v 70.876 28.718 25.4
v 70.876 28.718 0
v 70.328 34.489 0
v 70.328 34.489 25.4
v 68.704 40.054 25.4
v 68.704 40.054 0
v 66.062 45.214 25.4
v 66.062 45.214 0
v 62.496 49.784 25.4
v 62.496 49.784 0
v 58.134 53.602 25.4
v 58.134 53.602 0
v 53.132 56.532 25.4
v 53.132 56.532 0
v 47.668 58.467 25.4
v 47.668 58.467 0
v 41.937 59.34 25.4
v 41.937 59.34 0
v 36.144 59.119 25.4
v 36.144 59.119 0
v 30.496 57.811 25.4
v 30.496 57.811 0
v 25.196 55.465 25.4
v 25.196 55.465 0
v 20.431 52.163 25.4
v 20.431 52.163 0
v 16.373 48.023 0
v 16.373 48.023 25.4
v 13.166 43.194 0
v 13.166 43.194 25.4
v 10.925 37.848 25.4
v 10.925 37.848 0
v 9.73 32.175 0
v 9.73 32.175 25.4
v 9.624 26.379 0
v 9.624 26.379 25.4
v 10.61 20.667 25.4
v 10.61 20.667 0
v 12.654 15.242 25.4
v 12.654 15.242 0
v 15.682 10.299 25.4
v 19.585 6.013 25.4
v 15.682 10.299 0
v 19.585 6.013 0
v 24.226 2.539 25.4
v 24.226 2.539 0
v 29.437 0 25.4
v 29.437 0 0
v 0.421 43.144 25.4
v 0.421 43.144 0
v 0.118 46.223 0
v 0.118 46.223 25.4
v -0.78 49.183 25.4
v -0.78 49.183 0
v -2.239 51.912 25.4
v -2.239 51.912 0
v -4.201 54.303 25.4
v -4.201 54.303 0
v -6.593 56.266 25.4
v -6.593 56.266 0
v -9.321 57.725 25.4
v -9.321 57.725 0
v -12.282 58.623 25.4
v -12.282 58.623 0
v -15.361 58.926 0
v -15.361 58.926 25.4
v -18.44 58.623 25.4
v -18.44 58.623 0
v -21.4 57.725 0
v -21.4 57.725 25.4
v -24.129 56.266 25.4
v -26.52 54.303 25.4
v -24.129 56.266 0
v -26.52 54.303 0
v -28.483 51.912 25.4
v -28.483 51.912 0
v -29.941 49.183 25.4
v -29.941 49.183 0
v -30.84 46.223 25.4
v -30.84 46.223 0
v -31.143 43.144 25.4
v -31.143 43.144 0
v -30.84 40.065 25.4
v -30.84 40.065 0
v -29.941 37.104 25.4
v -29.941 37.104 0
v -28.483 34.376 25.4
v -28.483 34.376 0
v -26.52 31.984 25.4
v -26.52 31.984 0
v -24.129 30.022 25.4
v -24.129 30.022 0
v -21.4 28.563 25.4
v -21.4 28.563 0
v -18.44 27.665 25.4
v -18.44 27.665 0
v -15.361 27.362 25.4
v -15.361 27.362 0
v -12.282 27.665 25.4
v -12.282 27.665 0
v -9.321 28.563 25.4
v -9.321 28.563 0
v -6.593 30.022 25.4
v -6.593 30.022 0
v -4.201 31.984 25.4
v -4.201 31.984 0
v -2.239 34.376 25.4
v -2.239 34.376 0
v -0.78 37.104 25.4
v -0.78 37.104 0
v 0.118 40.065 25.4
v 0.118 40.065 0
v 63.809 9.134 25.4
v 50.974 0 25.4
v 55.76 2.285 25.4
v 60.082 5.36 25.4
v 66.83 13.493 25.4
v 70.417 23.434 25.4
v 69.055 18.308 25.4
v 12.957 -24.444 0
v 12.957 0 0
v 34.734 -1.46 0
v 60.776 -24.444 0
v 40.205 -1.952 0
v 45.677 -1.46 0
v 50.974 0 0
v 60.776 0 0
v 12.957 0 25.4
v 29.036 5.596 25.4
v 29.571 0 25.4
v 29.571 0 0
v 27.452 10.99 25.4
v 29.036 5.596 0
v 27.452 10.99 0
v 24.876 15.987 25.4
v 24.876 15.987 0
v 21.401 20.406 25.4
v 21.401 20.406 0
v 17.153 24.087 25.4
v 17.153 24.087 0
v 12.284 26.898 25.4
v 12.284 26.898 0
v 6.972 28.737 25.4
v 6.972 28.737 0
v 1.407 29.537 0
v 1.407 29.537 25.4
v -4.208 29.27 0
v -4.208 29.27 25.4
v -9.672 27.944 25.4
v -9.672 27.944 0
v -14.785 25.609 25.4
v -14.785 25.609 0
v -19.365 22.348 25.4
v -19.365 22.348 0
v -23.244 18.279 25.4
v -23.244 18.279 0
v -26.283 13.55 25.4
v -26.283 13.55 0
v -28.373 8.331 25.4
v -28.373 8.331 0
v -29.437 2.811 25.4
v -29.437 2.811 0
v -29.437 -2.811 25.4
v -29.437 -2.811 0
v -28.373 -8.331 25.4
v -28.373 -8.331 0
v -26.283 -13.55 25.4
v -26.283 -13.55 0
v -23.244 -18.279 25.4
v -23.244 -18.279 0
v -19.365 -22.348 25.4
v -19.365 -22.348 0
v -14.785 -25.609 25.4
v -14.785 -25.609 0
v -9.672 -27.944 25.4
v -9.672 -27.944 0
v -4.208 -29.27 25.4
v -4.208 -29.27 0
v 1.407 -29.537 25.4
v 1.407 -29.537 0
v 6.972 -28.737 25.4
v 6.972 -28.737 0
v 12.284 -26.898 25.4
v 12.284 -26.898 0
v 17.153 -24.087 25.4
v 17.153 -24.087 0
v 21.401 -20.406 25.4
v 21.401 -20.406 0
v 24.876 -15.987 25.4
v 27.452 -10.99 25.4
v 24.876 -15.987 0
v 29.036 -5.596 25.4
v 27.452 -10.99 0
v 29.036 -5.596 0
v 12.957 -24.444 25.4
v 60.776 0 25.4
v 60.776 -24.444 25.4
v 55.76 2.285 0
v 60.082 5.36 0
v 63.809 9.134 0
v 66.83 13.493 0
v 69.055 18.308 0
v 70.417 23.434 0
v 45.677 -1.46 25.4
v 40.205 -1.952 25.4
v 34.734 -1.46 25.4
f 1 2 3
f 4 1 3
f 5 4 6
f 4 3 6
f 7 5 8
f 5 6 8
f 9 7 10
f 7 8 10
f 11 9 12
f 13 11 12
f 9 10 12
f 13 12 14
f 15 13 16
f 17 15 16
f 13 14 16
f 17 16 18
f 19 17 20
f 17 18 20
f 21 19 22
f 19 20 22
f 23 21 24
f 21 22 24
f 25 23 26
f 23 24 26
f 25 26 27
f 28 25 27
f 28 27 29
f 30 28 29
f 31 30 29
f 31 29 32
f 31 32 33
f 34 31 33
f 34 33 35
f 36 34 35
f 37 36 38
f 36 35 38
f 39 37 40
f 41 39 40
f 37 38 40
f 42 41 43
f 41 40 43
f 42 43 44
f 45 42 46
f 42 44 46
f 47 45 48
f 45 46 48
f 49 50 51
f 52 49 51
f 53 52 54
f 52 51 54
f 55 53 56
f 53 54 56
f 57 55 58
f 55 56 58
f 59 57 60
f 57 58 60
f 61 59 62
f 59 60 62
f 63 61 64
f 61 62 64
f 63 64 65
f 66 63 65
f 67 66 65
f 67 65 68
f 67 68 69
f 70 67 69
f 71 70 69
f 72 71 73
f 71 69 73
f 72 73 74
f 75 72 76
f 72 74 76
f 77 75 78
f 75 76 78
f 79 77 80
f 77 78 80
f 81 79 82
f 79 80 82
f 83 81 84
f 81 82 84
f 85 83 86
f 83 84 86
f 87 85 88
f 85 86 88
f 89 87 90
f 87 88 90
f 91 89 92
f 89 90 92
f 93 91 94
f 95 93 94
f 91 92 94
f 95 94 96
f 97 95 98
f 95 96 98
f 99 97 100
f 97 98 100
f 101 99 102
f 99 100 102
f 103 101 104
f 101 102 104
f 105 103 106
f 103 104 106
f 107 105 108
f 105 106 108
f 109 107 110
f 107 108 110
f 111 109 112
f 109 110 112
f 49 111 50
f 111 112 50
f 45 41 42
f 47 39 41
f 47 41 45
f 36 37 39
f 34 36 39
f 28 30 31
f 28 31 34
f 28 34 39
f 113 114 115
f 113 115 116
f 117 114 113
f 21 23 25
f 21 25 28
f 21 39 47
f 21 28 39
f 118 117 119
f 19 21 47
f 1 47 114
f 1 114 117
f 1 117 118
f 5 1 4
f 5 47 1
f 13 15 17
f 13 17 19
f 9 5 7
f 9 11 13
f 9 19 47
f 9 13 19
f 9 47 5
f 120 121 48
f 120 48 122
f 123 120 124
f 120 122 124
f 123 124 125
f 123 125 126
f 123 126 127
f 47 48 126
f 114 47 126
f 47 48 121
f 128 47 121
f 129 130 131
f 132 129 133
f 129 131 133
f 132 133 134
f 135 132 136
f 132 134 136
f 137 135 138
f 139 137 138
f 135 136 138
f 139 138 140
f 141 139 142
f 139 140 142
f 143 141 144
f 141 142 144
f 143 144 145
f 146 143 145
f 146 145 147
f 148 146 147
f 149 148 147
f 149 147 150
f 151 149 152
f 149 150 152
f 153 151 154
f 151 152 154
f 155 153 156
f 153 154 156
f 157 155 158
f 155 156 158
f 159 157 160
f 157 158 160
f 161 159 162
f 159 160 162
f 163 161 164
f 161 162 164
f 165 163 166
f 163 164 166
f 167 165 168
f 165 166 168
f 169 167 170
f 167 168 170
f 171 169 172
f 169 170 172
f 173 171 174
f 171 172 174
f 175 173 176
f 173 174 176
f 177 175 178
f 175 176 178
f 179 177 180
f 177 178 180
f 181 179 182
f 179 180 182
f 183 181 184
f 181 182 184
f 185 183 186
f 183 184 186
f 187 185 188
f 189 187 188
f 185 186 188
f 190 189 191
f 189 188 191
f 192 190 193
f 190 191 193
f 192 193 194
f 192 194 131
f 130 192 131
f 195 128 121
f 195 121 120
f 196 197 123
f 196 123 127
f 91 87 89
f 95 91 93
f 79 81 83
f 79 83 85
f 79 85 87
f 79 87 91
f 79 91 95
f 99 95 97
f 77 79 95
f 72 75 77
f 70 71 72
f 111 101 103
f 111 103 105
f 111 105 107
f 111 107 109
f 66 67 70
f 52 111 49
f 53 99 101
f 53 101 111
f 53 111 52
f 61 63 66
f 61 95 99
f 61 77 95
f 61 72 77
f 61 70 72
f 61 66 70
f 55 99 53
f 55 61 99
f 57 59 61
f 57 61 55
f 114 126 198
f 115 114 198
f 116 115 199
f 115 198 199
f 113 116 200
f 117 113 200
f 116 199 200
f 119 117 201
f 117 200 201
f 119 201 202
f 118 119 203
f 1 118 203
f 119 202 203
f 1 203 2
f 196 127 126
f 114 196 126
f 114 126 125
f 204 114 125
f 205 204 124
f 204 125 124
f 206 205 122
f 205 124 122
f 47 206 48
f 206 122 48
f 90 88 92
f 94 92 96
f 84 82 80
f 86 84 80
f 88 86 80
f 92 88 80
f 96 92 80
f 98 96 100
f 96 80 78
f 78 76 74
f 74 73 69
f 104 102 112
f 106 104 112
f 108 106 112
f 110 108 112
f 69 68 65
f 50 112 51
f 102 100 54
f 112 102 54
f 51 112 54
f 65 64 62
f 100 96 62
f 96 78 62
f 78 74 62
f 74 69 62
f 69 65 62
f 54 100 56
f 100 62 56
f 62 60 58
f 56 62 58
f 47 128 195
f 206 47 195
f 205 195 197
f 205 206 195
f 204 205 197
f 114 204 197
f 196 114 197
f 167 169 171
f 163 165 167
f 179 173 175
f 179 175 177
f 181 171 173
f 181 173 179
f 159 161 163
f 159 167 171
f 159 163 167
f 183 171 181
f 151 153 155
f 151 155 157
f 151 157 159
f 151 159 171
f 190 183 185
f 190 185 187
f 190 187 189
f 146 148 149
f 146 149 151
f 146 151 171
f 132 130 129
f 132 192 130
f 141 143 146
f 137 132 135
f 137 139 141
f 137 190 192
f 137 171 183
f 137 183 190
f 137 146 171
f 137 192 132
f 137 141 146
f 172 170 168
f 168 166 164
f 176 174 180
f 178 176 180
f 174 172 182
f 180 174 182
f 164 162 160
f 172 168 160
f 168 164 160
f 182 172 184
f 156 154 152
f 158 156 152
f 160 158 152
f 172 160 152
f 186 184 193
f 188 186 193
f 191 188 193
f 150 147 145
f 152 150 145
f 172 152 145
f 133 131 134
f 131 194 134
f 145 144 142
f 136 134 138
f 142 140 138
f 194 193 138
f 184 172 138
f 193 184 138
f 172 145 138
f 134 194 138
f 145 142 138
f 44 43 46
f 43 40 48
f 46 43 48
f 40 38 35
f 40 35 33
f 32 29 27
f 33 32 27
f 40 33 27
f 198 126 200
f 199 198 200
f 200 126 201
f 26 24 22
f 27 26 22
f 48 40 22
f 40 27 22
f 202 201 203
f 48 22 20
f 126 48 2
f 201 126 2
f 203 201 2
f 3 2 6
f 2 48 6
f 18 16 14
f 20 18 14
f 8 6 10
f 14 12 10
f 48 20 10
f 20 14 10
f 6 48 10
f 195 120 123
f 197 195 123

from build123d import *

# Parameters (mm, degrees)
F0_R     = 29.5705775905
F3_DEPTH = 25.4
F1_R     = 15.7819327394


with BuildPart() as f3:
    # F0 (on Top) → F3 (new body)
    with BuildSketch(Plane.XY):
        Circle(F0_R)
    extrude(amount=F3_DEPTH)


with BuildPart() as f3b:
    # F2 (on Top) → F3, piece 2 (new body)
    with BuildSketch(Plane.XY):
        with BuildLine():
            ThreePointArc((50.9735147705, 0), (40.2053631842, -1.9524445325), (29.4372115979, 0))
            Line((29.4372115979, 0), (12.9565428942, 0))
            Line((12.9565428942, 0), (12.9565428942, -24.4437903166))
            Line((12.9565428942, -24.4437903166), (60.7755407691, -24.4437903166))
            Line((60.7755407691, -24.4437903166), (60.7755407691, 0))
            Line((60.7755407691, 0), (50.9735147705, 0))
        make_face()
    extrude(amount=F3_DEPTH)


with BuildPart() as f3c:
    # F2 (on Top) → F3, piece 3 (new body)
    with BuildSketch(Plane.XY):
        with BuildLine():
            ThreePointArc((50.9735147705, 0), (65.4139765628, 11.2478830466), (70.8759216159, 28.7181138992))
            ThreePointArc((70.8759216159, 28.7181138992), (22.7351323316, 53.9267272778), (29.4372115979, 0))
            Line((29.4372115979, 0), (50.9735147705, 0))
        make_face()
    extrude(amount=F3_DEPTH)


with BuildPart() as f3d:
    # F1 (on Top) → F3, piece 4 (new body)
    with BuildSketch(Plane.XY):
        with Locations((-15.3608517721, 43.1439578533)):
            Circle(F1_R)
    extrude(amount=F3_DEPTH)


solid = Compound([f3.part, f3b.part, f3c.part, f3d.part])
